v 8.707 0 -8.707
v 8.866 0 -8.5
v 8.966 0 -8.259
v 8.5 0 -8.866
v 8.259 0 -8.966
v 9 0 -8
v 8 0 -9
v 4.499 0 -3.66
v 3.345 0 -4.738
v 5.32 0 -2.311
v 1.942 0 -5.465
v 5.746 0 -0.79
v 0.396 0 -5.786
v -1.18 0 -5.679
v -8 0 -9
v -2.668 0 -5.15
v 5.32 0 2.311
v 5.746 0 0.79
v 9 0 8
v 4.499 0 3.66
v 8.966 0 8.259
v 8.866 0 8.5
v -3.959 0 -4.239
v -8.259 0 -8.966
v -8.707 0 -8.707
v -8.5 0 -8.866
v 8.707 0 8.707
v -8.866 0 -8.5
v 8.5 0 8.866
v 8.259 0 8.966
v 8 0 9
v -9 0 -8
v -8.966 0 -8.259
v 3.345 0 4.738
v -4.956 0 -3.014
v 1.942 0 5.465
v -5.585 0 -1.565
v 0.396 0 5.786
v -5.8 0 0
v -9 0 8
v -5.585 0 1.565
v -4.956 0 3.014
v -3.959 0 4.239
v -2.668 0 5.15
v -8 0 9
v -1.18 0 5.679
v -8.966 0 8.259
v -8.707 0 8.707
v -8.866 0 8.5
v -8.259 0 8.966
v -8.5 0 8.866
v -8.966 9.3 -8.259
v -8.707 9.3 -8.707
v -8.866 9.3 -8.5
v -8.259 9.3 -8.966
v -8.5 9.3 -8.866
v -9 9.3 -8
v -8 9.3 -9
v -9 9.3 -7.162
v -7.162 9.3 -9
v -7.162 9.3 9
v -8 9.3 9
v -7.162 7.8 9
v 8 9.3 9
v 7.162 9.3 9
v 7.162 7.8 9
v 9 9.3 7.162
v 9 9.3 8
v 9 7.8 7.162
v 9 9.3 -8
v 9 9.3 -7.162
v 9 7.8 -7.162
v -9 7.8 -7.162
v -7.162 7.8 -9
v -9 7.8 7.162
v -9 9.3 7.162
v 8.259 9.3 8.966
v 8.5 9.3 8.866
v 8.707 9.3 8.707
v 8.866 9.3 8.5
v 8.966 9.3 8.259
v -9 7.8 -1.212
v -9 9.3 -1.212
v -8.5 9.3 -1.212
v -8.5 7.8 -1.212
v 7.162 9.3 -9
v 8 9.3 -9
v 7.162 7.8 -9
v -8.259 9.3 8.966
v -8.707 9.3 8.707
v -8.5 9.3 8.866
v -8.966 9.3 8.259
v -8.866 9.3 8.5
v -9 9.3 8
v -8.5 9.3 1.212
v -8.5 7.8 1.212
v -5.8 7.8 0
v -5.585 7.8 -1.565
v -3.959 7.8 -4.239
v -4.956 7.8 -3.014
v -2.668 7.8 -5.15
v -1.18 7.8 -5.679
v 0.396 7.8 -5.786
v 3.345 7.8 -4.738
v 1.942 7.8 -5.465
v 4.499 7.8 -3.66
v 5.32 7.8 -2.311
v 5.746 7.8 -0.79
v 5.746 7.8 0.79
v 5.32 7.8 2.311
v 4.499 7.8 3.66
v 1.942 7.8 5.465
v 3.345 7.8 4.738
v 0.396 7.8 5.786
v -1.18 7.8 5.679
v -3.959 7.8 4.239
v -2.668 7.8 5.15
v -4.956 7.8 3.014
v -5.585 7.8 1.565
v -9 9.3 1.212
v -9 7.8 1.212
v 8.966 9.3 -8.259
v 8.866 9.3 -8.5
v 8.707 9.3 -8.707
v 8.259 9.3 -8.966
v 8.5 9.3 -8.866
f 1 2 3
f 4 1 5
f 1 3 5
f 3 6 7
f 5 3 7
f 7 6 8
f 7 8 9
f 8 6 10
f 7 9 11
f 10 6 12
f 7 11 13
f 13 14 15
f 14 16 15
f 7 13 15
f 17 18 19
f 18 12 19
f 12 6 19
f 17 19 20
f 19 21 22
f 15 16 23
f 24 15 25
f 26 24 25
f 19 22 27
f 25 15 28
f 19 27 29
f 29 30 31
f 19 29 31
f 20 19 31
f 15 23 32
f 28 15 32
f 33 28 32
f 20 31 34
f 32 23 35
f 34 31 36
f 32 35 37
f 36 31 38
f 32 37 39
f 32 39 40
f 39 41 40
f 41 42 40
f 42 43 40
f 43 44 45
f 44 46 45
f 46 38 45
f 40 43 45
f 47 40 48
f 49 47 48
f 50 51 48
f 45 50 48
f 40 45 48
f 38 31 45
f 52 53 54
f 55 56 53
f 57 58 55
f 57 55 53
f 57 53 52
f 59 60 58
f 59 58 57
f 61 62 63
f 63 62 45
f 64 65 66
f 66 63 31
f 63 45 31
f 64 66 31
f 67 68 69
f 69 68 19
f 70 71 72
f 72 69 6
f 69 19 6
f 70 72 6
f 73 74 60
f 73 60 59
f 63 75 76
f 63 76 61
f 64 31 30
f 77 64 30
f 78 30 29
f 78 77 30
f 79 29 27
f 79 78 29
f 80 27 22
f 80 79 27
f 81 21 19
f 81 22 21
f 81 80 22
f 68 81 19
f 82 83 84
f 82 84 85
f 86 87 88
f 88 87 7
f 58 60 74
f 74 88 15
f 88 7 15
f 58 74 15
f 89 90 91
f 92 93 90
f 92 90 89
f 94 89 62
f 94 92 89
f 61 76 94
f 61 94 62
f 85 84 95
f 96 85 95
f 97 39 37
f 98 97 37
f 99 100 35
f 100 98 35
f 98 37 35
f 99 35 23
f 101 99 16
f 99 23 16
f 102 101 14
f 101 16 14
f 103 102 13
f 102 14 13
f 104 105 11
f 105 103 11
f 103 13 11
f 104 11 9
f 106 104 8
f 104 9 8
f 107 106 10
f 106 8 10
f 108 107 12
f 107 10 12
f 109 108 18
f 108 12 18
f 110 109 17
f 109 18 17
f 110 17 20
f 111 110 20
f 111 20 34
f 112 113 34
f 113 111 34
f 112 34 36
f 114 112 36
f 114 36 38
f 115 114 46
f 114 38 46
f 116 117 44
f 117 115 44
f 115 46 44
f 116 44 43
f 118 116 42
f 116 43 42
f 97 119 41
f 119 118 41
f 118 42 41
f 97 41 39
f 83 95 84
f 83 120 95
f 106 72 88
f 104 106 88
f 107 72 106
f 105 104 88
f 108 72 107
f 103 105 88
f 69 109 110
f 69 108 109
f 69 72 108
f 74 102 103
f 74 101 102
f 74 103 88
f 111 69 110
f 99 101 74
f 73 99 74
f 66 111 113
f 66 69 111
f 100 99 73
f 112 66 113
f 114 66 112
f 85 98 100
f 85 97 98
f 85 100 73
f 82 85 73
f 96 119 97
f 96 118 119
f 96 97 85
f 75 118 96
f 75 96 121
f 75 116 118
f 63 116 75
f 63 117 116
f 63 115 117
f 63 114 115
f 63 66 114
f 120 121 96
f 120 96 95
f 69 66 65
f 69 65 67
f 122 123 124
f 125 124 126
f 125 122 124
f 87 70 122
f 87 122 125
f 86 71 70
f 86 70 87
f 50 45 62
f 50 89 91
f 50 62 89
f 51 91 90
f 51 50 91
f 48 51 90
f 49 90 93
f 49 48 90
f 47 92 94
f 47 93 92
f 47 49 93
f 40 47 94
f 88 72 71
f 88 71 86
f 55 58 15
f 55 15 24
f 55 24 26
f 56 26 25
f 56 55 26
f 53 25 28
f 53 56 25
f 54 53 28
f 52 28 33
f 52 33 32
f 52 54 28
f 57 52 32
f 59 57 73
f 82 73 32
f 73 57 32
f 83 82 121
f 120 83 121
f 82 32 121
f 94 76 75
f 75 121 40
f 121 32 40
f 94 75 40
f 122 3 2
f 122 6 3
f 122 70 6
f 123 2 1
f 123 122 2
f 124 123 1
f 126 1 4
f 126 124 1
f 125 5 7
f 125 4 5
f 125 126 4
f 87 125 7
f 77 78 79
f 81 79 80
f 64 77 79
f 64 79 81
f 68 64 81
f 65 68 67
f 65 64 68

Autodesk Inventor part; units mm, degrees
ref_plane "YZ Plane" through (0, 0, 0) normal (1, 0, 0) x (0, 1, 0)
ref_plane "XZ Plane" through (0, 0, 0) normal (0, 1, 0) x (-1, 0, 0)
ref_plane "XY Plane" through (0, 0, 0) normal (0, 0, 1) x (1, 0, 0)
sketch "Skizze1" plane through (0, 0, 0) normal (0, 1, 0) x (-1, 0, 0)
  line L0 (-9, -9) -> (9, -9)
  line L1 (9, -9) -> (9, 9)
  line L2 (9, 9) -> (-9, 9)
  line L3 (-9, 9) -> (-9, -9)
  line L4 (-9, -9) -> (9, 9) construction
  line L5 (9, -9) -> (-9, 9) construction
  circle A0 centre (0, 0) radius 5.8
  dimension "d0" = 18
  dimension "d1" = 18
  dimension "d2" = 11.6
extrude "Extrusion1" add sketch "Skizze1" along normal blind 7.8
sketch "Skizze2" plane through (0, 7.8, 0) normal (0, 1, 0) x (1, 0, 0)
  line L0 (-9, 9) -> (-9, -9) projected
  line L1 (-9, -9) -> (9, -9) projected
  line L2 (9, -9) -> (9, 9) projected
  line L3 (9, 9) -> (-9, 9) projected
  circle A0 centre (0, 0) radius 5.8 projected
  line L4 (-9, 9) -> (-9, -9) projected
  line L5 (-9, -7.1615) -> (-7.1615, -9)
  line L6 (-9, -7.1615) -> (-6.4, -7.1615) construction
  dimension "d5" = 45
  dimension "d6" = 1.3
extrude "Extrusion2" add sketch "Skizze2" along normal blind 1.5 contours L5 L1 L0
pattern_circular "Runde Anordnung1" count 4 over 360 about axis through (0, 0, 0) along (0, 1, 0) of "Extrusion2"
fillet "Rundung1" radius 1 4 edges at (-9, 4.65, 9) (9, 4.65, 9) (9, 4.65, -9) (-9, 4.65, -9)
sketch "Skizze3" plane through (-9, 7.8, 7.1615) normal (-1, 0, 0) x (0, 0, 1)
  line L0 (-15.1615, -7.8) -> (-15.1615, 1.5) projected
  line L1 (-15.1615, -7.8) -> (0.8385, -7.8) projected
  line L2 (0.8385, 1.5) -> (0.8385, -7.8) projected
  line L3 (0, 1.5) -> (0.8385, 1.5) projected
  line L4 (0, 0) -> (0, 1.5) projected
  line L5 (-14.323, 0) -> (0, 0) projected
  line L6 (-14.323, 0) -> (-14.323, 1.5) projected
  line L7 (-15.1615, 1.5) -> (-14.323, 1.5) projected
  line L8 (-8.3736, -1.5) -> (-5.9495, -1.5)
  line L9 (-5.9495, -1.5) -> (-5.9495, 1.5)
  line L10 (-5.9495, 1.5) -> (-8.3736, 1.5)
  line L11 (-8.3736, 1.5) -> (-8.3736, -1.5)
  line L12 (-14.323, 0) -> (0, 0) projected
  line L13 (-8.3736, -1.5) -> (-5.9495, 1.5) construction
  line L14 (-5.9495, -1.5) -> (-8.3736, 1.5) construction
  point P0 (-7.1615, -7.8)
  point P1 (-7.1615, 0)
extrude "Extrusion3" add sketch "Skizze3" against normal blind 0.5 contours L11 L10 L9 L5 | L5 L9 L8 L11
properties part number "00_VCM_M12"
